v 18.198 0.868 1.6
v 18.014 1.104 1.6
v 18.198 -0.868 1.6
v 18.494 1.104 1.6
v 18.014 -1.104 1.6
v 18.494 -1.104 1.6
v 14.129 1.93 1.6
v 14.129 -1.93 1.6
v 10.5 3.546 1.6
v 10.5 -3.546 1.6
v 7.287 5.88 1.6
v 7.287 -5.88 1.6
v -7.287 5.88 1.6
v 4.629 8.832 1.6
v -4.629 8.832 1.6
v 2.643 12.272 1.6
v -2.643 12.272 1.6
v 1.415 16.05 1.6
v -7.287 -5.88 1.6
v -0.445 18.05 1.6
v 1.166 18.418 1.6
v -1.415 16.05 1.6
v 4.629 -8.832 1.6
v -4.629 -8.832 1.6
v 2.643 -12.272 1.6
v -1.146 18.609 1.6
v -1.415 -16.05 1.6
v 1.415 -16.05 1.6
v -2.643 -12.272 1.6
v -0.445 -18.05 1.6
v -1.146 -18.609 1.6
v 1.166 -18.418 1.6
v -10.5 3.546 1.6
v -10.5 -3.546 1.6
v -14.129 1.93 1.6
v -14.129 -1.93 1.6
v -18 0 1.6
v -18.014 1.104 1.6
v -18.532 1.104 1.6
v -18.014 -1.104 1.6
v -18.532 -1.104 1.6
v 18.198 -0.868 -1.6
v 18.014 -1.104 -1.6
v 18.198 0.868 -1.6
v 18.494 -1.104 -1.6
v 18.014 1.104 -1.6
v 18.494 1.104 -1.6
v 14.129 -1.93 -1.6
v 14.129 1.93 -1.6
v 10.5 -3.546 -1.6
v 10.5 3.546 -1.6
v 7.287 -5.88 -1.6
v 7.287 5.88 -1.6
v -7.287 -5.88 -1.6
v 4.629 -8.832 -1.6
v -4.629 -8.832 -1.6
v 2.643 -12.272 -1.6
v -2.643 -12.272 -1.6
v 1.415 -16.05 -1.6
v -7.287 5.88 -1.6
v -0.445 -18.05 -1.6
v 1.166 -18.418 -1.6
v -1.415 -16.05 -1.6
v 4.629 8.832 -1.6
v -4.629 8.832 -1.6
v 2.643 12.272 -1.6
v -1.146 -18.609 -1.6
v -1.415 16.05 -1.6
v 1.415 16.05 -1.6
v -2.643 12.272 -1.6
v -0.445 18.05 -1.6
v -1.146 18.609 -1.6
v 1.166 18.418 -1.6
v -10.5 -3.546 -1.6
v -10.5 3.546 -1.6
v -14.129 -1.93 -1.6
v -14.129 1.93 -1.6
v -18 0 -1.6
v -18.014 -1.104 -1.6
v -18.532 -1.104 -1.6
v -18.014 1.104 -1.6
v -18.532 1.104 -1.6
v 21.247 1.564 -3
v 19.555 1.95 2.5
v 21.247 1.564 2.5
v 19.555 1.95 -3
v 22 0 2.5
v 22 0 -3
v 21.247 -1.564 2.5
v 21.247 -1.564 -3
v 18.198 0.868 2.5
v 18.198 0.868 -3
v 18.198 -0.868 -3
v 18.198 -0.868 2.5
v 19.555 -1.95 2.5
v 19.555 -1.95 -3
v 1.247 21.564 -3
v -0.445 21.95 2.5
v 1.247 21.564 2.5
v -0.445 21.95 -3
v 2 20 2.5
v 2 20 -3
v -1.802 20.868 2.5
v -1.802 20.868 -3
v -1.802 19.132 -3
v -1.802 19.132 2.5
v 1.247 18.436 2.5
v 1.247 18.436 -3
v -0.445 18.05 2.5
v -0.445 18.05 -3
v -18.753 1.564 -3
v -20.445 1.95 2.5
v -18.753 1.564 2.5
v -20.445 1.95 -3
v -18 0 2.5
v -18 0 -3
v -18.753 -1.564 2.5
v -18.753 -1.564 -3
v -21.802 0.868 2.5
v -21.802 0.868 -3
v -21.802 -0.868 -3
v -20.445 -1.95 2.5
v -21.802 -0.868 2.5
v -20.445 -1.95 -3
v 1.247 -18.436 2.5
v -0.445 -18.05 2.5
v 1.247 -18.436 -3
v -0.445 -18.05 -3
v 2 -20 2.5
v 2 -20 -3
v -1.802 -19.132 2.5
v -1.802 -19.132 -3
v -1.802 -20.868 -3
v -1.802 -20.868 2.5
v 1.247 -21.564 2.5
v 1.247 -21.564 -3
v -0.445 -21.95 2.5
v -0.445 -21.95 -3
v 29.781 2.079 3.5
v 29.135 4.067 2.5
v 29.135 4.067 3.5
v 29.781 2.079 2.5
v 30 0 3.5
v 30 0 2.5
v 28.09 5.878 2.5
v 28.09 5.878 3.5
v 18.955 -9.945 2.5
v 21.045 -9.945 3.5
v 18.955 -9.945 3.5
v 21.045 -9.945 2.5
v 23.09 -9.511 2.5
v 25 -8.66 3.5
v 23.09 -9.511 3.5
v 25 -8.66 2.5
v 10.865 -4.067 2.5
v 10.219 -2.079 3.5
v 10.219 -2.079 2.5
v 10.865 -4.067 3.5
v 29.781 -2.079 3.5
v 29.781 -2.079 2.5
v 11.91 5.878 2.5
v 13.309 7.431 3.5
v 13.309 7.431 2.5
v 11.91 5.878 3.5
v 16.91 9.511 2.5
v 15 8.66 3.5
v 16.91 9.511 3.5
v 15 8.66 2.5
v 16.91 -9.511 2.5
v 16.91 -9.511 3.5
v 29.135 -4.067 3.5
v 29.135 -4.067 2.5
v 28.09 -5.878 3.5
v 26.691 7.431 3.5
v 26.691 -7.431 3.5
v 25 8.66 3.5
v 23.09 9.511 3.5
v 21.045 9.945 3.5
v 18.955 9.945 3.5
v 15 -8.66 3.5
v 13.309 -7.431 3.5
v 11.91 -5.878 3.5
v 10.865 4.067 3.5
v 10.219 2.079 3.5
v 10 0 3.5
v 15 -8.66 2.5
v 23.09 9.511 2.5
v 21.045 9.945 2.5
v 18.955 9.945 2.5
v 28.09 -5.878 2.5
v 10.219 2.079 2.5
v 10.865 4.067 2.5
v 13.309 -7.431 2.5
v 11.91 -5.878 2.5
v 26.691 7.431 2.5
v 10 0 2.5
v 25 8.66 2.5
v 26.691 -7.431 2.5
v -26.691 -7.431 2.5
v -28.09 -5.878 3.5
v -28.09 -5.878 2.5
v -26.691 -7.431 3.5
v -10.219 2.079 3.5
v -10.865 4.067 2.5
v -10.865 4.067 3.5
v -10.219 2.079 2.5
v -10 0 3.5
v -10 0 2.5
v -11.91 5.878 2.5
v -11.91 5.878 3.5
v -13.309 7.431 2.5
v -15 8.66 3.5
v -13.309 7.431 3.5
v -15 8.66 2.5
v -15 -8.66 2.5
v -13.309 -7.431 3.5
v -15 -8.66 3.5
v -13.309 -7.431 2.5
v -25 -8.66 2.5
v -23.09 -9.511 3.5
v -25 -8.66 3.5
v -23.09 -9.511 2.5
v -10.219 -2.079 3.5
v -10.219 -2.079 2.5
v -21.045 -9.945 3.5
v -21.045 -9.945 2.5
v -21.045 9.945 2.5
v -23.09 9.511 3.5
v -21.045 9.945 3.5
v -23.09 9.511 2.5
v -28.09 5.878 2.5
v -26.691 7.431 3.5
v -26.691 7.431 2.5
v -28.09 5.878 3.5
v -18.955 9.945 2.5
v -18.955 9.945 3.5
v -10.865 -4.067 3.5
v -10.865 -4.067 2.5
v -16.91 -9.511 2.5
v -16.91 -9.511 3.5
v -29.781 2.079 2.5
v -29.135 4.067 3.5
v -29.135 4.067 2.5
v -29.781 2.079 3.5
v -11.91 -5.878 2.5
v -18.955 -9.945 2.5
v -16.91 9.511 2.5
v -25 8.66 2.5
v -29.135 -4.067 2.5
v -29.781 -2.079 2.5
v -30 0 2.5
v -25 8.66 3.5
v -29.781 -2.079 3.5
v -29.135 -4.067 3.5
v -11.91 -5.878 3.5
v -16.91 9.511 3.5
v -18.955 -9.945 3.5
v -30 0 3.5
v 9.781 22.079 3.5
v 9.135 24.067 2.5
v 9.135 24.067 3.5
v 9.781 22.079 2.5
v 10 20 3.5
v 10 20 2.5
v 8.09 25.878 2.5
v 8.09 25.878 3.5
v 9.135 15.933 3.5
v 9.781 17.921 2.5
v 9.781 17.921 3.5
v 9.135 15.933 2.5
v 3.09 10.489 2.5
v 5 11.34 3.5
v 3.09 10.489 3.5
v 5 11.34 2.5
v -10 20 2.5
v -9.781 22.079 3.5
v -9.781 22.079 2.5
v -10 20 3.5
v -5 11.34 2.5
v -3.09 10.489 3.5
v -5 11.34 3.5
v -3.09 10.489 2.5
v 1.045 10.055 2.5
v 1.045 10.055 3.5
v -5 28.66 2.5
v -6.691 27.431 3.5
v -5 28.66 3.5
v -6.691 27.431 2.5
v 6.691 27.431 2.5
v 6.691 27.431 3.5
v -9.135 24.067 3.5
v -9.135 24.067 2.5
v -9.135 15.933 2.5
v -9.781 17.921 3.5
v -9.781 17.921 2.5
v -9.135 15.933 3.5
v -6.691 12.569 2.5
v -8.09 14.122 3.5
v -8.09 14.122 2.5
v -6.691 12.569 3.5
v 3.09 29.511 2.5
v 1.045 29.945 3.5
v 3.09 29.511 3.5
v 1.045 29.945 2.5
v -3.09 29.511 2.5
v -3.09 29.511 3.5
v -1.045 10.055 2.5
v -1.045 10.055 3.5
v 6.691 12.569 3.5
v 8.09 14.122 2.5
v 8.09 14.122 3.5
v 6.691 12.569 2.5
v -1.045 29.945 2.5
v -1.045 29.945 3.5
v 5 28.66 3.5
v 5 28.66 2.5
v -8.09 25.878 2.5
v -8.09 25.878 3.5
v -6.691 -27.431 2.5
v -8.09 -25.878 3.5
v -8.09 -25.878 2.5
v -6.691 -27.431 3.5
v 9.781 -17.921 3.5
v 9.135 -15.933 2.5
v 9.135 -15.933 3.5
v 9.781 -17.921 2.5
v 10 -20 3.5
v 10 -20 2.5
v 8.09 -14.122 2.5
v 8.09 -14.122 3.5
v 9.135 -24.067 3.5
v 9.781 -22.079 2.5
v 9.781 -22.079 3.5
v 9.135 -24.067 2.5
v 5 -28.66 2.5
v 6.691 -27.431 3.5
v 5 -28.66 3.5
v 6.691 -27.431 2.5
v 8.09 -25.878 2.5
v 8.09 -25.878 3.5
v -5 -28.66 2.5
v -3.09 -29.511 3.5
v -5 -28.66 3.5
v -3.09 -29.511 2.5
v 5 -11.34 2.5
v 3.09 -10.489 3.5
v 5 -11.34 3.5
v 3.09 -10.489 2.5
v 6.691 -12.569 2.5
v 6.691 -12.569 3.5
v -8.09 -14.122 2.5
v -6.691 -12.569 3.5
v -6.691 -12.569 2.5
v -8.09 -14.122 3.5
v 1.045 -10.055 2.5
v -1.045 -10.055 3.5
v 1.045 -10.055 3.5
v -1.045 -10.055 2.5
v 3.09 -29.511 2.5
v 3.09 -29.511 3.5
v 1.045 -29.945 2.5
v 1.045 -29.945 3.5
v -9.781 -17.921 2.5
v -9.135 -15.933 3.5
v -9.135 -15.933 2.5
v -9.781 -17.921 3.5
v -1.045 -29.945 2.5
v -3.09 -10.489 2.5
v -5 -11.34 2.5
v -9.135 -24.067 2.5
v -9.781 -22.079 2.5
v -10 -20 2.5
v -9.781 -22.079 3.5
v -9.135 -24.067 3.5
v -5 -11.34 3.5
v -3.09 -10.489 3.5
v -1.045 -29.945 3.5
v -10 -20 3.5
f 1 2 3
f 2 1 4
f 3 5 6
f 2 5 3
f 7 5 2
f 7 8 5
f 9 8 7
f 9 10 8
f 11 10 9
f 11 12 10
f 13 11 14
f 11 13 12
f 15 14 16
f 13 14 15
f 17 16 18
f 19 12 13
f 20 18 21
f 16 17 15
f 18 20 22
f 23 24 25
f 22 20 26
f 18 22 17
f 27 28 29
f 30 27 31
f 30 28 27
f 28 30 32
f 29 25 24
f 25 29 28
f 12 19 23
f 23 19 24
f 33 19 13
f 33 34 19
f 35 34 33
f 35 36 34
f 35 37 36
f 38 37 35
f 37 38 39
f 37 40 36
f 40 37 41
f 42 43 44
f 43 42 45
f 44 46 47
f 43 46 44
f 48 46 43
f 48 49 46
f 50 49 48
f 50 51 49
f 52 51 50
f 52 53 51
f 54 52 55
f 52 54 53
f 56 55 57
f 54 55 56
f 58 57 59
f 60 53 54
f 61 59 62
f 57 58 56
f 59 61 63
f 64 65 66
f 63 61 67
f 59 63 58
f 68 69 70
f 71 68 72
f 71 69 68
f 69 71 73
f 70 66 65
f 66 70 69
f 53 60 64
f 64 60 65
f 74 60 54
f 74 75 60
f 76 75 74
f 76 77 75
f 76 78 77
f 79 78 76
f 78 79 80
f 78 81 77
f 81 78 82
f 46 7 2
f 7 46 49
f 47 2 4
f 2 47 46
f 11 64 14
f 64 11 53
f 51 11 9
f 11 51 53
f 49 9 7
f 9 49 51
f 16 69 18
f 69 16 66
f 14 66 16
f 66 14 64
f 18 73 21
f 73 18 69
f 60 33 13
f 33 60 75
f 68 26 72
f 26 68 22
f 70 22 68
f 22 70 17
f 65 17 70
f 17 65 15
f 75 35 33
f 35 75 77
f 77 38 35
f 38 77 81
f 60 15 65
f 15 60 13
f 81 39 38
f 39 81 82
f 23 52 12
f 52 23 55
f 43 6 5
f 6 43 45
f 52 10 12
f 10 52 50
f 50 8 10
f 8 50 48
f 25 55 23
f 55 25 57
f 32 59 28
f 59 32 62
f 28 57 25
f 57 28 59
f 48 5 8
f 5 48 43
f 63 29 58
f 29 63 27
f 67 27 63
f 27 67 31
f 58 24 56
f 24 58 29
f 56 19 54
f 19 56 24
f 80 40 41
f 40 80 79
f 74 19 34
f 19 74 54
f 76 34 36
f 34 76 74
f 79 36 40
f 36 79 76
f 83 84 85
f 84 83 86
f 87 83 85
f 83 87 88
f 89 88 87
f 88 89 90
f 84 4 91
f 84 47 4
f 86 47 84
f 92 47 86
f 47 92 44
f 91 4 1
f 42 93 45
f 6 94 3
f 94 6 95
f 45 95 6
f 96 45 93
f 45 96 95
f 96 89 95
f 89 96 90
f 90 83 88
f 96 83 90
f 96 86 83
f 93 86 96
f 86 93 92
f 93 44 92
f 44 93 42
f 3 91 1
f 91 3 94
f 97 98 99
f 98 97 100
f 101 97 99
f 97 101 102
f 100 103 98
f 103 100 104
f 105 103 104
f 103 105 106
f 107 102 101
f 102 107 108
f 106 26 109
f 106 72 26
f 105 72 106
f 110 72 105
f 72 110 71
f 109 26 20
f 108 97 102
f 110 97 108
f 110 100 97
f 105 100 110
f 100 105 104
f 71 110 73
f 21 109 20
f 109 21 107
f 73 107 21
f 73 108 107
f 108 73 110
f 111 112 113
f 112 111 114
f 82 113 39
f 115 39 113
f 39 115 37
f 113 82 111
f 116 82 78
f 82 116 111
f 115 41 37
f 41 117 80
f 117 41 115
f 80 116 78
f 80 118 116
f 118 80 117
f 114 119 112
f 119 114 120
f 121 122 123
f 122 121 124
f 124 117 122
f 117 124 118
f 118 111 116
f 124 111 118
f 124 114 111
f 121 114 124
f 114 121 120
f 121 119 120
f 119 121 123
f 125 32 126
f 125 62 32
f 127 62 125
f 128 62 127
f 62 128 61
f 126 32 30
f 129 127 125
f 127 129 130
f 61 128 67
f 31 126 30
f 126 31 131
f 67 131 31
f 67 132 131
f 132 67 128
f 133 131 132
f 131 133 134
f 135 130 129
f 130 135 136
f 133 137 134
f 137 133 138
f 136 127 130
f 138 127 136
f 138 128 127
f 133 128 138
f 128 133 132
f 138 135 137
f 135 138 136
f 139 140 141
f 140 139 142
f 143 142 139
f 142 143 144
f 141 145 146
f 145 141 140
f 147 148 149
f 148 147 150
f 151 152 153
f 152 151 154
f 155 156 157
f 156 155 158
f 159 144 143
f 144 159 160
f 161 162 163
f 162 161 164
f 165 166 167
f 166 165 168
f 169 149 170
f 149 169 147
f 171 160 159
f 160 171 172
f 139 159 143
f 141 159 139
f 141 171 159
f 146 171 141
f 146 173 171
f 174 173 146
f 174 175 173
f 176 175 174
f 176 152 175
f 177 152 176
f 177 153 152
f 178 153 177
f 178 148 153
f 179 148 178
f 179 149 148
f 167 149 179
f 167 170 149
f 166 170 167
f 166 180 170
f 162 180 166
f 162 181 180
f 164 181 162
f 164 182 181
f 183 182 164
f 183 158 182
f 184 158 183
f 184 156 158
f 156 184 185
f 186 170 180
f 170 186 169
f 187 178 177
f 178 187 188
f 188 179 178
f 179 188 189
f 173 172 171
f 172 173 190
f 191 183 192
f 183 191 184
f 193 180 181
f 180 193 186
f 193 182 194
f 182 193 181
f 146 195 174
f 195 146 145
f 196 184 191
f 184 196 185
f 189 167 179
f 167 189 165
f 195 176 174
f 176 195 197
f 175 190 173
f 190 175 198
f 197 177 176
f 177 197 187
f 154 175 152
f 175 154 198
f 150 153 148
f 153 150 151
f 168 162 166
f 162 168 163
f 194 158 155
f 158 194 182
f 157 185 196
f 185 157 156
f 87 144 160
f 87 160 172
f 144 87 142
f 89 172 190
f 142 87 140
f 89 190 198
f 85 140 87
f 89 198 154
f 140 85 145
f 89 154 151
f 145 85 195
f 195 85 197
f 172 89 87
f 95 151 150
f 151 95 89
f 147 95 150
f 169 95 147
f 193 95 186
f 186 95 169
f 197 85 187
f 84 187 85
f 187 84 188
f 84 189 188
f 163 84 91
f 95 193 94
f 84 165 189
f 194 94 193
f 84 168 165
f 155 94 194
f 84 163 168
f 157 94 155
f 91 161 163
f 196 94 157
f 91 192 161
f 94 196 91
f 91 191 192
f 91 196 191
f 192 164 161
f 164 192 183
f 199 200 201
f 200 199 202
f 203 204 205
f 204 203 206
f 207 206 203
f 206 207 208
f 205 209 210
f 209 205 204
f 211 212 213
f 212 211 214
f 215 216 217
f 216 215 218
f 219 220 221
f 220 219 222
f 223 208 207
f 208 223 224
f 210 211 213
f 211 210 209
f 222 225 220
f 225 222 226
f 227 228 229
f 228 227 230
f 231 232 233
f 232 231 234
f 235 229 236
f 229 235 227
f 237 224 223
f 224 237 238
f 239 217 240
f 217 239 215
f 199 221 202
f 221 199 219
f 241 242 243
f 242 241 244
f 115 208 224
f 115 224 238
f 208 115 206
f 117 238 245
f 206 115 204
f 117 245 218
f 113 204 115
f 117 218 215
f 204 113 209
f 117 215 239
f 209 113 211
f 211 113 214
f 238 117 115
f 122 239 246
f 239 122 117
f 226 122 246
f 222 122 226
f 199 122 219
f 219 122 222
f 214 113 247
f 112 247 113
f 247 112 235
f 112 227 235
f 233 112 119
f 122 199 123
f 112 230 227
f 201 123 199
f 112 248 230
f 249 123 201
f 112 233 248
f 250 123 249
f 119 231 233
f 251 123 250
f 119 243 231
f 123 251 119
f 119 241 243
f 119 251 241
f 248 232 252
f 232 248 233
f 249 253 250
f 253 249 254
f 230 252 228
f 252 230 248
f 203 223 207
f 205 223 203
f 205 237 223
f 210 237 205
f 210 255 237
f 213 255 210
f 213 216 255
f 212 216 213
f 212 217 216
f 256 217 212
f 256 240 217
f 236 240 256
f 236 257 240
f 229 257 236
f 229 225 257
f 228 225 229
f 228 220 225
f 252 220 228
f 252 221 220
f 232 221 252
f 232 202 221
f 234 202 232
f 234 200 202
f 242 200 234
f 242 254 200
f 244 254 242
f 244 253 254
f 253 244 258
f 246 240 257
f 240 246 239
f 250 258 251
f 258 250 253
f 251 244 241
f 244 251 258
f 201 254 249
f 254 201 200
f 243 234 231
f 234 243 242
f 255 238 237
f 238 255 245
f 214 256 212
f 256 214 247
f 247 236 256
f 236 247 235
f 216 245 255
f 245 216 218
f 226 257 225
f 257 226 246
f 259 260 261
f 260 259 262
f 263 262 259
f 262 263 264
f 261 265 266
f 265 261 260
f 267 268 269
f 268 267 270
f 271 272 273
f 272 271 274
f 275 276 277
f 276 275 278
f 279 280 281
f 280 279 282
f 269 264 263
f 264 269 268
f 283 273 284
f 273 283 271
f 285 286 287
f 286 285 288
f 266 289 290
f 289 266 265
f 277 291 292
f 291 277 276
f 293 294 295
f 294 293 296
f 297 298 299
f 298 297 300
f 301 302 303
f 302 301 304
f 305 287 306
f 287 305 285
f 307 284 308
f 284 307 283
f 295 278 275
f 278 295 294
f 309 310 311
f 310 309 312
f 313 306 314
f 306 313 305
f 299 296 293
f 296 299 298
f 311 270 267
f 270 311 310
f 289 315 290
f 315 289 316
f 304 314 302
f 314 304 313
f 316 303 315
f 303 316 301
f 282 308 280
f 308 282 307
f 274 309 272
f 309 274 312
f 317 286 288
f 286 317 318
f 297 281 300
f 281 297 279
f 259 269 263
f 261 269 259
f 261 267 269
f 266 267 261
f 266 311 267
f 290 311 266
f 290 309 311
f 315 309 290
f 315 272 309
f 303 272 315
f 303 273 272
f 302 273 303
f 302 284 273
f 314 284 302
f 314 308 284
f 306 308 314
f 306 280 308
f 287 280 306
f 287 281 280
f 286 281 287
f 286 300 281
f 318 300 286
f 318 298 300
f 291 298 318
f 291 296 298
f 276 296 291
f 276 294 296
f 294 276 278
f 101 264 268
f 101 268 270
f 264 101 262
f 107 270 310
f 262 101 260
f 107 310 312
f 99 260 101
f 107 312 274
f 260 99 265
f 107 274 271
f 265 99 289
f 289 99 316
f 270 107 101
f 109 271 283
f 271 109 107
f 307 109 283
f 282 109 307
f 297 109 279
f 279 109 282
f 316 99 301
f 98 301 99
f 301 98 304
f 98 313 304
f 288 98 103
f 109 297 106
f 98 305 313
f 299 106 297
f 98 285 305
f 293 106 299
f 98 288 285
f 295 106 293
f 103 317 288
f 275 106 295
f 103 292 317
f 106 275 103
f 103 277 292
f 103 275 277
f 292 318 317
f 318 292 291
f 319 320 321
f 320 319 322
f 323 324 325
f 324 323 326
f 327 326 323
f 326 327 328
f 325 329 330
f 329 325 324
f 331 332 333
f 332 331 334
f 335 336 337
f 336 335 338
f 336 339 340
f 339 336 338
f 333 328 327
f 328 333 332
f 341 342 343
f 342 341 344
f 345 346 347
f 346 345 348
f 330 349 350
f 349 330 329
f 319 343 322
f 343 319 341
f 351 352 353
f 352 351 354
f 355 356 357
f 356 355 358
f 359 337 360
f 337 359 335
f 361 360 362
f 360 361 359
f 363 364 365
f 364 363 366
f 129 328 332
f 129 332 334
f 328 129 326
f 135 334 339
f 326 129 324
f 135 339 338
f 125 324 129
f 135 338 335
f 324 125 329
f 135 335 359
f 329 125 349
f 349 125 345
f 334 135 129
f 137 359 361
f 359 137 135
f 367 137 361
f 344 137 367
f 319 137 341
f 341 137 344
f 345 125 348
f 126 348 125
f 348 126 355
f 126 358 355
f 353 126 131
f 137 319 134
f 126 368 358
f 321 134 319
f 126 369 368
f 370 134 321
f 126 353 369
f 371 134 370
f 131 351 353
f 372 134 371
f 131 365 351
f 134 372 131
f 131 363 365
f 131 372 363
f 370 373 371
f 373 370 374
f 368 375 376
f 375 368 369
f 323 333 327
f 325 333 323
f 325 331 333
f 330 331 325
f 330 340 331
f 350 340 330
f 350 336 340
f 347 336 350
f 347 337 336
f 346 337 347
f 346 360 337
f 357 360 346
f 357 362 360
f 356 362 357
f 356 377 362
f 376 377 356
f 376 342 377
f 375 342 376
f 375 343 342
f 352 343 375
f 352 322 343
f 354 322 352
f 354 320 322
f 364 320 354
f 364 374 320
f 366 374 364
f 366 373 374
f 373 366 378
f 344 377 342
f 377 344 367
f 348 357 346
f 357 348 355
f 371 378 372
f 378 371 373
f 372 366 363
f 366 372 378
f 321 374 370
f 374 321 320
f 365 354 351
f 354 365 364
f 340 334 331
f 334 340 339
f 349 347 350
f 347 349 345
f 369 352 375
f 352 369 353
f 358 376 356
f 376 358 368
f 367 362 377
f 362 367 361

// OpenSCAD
length = 40;
edge = length*0.5;
r_d = edge - 1;
h_p = length*0.1*1.5;
r_p = length/20;
r_prop = 10;

module body(){
difference() { cube([length, length, length*0.08], center=true);
    translate([edge, edge, 0]) 
    cylinder(r=r_d, h=h_p, center=true);        translate([-edge, edge, 0]) 
    cylinder(r=r_d, h=h_p, center=true);      translate([edge, -edge, 0]) 
    cylinder(r=r_d, h=h_p, center=true);     translate([-edge, -edge, 0]) 
    cylinder(r=r_d, h=h_p, center=true); 
}
}
module pillar(){
translate([edge,0,0])
    cylinder(r=r_p,h=h_p, center=true);
translate([0,edge,0])
    cylinder(r=r_p,h=h_p, center=true);
translate([-edge,0,0])
    cylinder(r=r_p,h=h_p, center=true);
translate([0,-edge,0])
    cylinder(r=r_p,h=h_p, center=true);
}

module prop(){
translate([edge,0,h_p*0.5])
    cylinder(r=r_prop,h=r_prop*0.1, center=true);
translate([-edge,0,h_p*0.5])
    cylinder(r=r_prop,h=r_prop*0.1, center=true);
translate([0,edge,h_p*0.5])
    cylinder(r=r_prop,h=r_prop*0.1, center=true);
translate([0,-edge,h_p*0.5])
    cylinder(r=r_prop,h=r_prop*0.1, center=true);
}

module assembly(){ 

    body();
    pillar();
    prop();

}

assembly();
